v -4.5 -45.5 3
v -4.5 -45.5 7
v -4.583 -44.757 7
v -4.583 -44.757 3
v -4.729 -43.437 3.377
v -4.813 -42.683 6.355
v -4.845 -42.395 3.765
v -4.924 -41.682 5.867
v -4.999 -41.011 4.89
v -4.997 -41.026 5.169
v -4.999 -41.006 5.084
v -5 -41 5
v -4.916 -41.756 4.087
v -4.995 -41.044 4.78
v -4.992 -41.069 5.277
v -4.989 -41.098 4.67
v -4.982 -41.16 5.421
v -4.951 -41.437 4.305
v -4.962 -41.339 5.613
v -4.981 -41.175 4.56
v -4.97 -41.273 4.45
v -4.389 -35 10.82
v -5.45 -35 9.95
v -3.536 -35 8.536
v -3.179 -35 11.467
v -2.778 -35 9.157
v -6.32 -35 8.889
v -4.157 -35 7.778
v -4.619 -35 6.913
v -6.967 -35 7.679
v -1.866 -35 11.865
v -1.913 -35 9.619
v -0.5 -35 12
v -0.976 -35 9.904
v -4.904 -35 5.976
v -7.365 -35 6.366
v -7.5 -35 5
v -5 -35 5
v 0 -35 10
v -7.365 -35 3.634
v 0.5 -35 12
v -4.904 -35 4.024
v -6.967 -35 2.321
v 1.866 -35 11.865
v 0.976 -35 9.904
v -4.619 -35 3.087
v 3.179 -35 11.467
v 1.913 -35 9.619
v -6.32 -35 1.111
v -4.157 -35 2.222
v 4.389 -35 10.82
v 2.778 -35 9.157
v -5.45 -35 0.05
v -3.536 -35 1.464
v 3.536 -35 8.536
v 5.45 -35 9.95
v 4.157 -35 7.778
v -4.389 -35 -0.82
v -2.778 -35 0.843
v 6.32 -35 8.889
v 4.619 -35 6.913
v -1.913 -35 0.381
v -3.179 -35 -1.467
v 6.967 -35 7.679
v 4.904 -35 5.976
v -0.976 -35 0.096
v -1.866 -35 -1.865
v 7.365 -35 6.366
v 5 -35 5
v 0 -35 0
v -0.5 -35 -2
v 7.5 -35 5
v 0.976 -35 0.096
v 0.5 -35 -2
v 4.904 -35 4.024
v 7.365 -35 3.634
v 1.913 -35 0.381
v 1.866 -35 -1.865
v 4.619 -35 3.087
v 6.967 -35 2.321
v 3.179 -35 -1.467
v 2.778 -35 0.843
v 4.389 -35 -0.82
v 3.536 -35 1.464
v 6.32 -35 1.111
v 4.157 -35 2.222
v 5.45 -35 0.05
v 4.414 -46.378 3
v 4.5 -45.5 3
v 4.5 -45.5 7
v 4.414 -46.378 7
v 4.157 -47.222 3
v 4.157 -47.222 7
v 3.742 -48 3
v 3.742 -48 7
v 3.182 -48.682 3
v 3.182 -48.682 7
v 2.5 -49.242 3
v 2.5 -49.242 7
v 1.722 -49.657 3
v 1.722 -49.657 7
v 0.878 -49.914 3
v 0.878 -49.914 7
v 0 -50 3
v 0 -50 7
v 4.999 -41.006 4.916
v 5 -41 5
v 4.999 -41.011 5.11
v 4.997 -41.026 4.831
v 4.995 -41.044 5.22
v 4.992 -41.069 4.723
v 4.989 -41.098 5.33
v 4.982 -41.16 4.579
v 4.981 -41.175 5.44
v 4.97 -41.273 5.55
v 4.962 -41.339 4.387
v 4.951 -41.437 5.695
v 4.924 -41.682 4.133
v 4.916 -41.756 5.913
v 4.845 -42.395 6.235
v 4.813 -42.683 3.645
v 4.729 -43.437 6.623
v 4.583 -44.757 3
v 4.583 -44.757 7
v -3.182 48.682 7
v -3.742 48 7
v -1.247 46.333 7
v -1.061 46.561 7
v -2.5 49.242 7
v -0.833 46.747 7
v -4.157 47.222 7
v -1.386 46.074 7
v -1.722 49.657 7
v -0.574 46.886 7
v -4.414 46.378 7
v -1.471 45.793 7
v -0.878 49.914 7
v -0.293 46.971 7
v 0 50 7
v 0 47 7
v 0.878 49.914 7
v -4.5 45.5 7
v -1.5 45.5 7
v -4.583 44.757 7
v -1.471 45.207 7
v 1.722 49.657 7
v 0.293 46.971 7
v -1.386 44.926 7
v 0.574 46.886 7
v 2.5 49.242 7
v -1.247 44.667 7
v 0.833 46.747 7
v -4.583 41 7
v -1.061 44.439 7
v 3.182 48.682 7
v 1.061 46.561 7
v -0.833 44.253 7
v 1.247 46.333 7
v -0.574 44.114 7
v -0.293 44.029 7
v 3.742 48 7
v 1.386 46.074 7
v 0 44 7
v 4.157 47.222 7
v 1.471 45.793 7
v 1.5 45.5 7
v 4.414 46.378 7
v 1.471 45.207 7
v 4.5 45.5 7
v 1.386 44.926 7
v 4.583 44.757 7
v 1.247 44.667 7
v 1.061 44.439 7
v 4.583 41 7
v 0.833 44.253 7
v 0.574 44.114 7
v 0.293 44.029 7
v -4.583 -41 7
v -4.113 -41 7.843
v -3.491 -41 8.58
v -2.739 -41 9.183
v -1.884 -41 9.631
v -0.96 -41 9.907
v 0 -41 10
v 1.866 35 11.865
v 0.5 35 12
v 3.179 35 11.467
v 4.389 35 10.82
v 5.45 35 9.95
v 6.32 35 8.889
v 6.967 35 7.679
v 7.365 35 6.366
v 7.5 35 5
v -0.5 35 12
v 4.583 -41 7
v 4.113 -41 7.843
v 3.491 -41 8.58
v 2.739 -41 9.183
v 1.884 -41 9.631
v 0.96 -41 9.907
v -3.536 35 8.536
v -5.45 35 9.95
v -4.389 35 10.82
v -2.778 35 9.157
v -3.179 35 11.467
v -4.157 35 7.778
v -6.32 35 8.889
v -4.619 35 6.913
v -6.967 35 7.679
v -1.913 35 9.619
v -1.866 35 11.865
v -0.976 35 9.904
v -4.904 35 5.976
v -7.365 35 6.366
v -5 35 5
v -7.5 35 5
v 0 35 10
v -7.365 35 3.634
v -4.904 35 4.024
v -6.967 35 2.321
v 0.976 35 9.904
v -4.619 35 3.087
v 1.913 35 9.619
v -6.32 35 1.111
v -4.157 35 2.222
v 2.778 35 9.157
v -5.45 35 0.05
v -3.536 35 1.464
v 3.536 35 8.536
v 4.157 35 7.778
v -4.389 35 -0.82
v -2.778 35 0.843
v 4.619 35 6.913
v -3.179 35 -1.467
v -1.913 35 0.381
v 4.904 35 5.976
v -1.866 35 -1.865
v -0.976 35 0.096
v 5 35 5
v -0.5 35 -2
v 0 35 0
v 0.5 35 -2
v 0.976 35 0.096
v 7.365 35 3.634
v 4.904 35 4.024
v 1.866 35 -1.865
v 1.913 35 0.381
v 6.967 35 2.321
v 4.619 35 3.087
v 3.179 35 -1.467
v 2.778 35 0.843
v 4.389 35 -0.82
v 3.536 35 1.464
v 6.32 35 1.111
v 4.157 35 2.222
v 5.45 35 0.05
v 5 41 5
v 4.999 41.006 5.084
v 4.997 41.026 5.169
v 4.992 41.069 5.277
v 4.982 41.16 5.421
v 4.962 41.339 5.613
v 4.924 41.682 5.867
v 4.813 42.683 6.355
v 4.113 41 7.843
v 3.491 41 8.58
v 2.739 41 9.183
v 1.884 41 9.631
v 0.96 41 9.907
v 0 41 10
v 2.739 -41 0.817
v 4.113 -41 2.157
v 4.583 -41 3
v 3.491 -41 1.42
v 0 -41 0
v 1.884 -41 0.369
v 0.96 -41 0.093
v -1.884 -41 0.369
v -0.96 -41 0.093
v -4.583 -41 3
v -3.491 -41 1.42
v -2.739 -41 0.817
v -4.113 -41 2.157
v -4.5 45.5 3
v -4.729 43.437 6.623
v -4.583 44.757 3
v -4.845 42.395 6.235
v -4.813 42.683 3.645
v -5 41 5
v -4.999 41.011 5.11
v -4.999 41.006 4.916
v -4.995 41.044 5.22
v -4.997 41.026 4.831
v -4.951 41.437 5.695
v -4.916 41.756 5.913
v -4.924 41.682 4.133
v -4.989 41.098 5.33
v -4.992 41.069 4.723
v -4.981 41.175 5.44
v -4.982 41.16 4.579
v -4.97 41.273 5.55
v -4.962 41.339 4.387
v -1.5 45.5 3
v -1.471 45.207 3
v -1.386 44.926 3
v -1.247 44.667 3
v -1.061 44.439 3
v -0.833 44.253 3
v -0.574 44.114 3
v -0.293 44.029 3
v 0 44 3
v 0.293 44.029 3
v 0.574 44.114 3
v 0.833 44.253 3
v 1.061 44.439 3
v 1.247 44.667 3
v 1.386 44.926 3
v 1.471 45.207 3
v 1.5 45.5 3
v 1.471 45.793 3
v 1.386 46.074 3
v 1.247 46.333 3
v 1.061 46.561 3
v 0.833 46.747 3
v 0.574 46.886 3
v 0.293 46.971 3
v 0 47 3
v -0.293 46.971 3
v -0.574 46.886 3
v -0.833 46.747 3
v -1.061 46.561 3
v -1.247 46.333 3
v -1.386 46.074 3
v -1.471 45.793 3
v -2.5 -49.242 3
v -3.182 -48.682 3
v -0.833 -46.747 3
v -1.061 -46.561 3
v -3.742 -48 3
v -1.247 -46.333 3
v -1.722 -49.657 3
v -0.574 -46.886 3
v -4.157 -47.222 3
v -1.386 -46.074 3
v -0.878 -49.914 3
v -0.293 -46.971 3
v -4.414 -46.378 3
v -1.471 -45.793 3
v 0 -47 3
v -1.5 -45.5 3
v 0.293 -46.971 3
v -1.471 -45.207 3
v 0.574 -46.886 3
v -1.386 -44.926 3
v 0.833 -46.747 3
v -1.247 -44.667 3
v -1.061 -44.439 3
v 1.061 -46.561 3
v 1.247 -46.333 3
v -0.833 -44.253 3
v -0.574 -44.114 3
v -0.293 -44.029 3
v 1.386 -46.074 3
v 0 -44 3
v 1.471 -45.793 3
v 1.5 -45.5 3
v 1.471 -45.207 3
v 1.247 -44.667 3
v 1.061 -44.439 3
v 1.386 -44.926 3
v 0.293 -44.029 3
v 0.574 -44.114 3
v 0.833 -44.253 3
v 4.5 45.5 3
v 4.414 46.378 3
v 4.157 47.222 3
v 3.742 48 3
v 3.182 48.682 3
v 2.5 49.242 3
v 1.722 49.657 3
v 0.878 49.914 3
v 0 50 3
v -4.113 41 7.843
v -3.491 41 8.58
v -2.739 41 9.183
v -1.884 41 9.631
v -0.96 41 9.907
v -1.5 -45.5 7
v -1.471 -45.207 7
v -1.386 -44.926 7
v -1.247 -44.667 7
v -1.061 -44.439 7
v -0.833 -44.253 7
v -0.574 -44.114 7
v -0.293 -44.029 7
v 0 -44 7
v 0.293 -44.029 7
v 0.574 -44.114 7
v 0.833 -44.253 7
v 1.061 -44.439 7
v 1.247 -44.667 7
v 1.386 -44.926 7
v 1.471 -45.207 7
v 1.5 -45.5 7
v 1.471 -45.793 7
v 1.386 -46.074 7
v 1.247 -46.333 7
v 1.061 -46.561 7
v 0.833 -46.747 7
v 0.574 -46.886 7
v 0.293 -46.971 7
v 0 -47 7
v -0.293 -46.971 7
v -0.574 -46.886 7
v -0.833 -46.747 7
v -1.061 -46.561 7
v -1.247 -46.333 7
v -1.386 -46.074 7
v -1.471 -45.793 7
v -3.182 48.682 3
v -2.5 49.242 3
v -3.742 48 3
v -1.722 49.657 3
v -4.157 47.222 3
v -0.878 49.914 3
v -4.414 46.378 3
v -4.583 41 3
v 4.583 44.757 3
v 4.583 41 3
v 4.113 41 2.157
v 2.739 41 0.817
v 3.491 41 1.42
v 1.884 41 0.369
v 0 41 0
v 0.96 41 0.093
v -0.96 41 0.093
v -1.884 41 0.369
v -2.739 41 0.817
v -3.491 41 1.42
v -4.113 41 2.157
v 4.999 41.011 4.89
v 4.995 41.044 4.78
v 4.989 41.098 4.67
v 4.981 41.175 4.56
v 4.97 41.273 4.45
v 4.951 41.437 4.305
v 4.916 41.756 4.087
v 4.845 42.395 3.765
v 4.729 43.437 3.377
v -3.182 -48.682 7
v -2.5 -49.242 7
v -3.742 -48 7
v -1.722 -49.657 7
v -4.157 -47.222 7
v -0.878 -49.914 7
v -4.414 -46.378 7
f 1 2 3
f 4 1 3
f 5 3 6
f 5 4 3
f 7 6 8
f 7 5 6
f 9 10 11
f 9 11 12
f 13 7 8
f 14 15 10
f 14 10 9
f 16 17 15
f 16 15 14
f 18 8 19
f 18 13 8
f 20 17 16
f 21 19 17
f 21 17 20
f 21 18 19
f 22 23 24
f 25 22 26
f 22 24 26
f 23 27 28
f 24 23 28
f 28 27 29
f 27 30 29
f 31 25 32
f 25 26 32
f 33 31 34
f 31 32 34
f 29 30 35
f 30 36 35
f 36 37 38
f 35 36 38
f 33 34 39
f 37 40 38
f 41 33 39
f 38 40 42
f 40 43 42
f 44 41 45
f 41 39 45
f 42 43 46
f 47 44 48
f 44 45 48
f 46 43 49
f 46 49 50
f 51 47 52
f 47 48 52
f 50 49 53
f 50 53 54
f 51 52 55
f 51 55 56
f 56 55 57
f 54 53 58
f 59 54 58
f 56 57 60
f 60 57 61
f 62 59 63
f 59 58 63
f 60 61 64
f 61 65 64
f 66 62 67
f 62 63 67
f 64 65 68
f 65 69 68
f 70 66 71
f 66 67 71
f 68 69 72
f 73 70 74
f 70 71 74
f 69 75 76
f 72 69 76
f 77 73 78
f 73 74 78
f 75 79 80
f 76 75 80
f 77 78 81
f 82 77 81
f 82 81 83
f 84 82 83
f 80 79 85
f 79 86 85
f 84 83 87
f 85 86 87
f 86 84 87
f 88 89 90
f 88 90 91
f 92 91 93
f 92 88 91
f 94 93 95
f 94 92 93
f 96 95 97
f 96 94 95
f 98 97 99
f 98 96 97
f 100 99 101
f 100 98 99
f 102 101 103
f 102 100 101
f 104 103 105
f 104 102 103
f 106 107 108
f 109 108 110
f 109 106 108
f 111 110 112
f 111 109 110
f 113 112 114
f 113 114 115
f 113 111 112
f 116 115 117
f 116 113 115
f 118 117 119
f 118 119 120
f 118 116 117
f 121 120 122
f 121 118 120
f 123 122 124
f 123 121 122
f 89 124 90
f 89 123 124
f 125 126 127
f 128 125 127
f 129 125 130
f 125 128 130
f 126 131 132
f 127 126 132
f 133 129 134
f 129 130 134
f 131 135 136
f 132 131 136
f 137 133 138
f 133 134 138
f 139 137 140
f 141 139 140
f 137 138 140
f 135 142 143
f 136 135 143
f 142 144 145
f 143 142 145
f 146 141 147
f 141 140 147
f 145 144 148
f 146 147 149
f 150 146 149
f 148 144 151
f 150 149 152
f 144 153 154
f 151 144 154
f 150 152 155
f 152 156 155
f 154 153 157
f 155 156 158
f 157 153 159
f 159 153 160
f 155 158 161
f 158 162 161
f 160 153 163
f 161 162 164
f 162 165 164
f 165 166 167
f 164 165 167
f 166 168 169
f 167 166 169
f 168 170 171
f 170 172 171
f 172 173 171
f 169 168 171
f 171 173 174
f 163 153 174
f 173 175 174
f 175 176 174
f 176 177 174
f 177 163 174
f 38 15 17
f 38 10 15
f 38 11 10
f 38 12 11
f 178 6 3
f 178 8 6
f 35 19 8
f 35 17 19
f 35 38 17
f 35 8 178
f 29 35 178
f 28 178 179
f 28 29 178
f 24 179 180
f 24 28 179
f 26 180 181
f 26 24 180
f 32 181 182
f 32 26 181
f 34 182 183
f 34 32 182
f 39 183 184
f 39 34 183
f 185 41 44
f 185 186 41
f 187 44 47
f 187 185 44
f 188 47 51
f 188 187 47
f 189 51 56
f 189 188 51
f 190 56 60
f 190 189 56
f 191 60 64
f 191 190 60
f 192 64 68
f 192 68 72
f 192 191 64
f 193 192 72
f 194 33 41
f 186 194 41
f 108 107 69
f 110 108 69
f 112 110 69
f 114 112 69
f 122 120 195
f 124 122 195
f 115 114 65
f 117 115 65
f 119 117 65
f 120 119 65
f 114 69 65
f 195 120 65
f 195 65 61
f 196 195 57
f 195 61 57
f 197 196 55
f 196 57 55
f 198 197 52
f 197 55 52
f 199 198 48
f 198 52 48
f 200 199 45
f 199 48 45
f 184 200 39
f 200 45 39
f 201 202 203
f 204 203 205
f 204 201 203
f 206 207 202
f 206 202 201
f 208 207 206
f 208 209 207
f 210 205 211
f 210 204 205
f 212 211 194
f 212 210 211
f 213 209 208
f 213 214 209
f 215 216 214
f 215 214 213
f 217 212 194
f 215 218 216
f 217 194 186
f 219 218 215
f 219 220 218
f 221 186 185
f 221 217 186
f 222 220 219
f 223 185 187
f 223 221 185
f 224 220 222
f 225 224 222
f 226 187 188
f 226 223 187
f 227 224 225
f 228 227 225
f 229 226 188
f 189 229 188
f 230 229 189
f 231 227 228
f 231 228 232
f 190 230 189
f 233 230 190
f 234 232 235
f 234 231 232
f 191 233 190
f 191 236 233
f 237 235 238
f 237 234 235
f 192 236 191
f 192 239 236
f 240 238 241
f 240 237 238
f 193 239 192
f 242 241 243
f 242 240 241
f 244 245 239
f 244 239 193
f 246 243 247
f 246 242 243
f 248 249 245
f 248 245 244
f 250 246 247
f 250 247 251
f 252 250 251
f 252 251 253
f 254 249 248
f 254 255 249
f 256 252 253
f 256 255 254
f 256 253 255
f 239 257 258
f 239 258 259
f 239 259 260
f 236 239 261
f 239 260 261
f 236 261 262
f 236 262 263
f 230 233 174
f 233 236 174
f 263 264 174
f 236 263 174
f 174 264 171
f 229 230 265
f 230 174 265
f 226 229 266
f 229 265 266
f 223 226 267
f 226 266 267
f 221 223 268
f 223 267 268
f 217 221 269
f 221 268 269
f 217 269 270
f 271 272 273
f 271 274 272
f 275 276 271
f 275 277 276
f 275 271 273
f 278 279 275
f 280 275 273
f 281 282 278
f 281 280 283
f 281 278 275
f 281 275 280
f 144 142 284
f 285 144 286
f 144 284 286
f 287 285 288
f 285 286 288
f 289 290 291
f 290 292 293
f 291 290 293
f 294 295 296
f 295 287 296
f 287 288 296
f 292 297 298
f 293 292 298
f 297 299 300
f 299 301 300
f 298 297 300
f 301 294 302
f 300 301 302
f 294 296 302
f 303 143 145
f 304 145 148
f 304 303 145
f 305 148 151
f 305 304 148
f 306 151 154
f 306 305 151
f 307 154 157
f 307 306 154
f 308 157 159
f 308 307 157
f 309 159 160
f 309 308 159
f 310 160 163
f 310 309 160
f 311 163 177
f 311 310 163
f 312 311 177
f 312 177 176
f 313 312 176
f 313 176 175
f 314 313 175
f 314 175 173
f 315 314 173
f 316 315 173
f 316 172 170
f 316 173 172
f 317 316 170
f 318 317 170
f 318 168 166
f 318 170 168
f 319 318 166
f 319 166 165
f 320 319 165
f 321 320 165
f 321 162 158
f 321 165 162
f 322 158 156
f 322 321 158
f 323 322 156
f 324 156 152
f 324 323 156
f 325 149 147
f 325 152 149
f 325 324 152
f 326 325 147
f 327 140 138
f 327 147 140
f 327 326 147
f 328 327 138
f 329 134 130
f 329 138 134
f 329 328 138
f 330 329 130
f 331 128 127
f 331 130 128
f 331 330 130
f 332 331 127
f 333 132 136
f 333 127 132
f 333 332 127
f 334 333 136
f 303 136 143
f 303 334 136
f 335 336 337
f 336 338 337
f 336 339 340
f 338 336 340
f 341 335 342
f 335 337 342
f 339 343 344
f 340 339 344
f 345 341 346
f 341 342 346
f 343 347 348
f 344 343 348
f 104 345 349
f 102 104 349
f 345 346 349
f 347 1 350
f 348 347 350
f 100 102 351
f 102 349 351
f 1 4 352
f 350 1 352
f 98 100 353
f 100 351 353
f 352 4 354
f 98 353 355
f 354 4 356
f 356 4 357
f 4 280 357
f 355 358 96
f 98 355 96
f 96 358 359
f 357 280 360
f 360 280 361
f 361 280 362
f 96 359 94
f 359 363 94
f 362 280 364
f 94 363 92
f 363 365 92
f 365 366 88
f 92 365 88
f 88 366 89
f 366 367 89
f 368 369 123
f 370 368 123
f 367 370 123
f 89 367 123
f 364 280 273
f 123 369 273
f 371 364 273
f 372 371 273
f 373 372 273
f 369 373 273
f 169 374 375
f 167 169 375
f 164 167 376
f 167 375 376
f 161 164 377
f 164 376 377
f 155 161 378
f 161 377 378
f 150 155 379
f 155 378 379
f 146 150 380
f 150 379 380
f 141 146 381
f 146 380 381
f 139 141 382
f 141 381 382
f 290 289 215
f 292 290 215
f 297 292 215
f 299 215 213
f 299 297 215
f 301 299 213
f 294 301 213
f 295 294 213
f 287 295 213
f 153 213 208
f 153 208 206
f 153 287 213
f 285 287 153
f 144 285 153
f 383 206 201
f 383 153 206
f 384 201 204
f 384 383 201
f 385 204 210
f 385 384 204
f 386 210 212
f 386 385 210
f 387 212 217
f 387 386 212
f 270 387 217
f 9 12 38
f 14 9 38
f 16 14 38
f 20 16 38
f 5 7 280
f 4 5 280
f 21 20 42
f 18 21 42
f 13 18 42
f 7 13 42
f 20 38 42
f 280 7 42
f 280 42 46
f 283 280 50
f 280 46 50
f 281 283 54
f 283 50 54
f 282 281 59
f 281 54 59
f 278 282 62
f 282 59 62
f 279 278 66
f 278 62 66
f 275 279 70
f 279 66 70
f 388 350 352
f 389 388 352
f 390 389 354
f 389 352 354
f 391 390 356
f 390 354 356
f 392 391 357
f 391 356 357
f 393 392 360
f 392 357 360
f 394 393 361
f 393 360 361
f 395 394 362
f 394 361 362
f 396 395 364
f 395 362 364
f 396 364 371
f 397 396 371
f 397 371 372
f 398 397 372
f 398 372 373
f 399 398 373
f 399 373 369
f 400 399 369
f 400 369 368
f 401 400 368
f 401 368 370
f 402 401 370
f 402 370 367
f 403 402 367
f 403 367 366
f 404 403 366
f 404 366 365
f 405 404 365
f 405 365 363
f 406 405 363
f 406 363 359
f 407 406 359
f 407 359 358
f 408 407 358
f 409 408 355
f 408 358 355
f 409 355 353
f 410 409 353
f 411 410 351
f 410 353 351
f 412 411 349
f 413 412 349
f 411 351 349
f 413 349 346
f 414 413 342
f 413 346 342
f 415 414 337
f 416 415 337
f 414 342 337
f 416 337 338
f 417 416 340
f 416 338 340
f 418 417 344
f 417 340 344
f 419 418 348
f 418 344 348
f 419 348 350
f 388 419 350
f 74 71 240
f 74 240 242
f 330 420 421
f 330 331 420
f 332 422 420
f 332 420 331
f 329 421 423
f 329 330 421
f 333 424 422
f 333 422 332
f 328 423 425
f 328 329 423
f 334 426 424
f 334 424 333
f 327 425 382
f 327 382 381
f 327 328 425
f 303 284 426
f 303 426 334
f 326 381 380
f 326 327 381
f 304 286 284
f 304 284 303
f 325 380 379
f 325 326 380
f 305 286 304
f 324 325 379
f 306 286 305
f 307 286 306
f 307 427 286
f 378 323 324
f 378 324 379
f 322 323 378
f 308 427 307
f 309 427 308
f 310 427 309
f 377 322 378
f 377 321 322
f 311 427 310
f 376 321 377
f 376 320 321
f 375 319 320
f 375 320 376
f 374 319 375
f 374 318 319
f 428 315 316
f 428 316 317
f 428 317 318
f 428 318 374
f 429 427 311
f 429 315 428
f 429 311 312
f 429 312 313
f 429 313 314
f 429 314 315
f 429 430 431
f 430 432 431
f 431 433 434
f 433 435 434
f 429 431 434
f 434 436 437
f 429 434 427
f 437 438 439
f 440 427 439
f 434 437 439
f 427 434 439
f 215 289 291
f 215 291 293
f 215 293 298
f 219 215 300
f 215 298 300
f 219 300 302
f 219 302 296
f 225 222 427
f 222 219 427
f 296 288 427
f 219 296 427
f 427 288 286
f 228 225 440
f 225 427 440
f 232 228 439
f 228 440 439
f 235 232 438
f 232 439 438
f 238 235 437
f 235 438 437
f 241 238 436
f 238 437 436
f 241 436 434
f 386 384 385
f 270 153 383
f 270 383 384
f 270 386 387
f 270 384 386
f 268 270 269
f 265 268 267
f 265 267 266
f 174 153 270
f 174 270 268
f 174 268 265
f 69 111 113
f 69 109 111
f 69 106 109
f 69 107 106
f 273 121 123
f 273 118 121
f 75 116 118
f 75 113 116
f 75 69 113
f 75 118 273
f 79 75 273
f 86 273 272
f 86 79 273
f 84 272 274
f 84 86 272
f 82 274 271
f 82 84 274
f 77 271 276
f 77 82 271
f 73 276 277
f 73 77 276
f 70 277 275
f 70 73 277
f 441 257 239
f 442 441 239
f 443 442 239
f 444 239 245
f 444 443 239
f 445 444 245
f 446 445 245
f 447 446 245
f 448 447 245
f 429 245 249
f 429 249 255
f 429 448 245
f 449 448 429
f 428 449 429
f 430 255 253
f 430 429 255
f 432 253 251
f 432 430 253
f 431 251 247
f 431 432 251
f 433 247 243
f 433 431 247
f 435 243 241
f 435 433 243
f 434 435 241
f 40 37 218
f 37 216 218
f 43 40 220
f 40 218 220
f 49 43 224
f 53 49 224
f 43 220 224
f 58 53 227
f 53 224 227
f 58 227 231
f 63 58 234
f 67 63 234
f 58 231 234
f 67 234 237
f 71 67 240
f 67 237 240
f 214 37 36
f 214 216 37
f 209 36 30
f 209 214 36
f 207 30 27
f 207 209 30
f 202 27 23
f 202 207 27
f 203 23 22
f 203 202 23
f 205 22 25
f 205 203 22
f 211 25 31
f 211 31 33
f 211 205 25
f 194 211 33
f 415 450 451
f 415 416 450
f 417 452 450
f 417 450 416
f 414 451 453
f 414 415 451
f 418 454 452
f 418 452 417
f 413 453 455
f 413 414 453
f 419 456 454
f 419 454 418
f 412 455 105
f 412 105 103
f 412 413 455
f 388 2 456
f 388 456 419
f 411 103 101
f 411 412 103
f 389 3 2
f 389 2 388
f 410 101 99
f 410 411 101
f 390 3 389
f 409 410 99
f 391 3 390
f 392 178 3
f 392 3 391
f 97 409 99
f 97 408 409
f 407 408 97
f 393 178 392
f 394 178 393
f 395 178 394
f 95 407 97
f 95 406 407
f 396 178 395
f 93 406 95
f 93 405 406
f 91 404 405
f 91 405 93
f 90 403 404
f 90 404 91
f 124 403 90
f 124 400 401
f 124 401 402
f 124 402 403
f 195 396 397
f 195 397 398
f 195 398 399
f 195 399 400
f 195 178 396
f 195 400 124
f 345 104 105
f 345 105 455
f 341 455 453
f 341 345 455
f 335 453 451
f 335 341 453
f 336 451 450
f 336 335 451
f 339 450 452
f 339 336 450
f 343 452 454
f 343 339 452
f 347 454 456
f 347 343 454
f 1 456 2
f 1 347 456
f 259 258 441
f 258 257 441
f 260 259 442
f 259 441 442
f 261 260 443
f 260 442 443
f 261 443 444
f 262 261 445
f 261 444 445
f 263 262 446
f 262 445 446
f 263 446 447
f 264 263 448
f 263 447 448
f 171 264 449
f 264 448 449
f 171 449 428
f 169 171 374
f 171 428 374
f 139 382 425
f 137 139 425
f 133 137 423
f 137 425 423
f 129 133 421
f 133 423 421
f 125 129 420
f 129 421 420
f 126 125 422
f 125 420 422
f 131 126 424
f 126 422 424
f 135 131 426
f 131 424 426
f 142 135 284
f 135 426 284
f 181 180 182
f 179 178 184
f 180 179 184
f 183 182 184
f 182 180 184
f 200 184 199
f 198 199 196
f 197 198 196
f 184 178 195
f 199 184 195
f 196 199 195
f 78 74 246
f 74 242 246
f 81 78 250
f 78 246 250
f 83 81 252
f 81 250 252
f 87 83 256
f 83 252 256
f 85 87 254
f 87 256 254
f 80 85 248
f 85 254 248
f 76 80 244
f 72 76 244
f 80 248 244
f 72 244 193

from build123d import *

# Parameters (mm, degrees)
SKETCH2_W                = 10
SKETCH2_H                = 100
BOSS_EXTRUDE1_DEPTH      = 10
FILLET1_R                = 5
CUT_EXTRUDE1_DEPTH       = 3
CUT_EXTRUDE2_START       = 7
SKETCH3_2_W              = 10
SKETCH3_2_H              = 9
CUT_EXTRUDE2_DEPTH       = 3
CUT_EXTRUDE4_START       = -4
CUT_EXTRUDE4_DEPTH       = 56.23475383
SKETCH7_R                = 1.5
CUT_EXTRUDE5_DEPTH       = 51.734603576
BOSS_EXTRUDE2_DEPTH      = 7
BOSS_EXTRUDE2_DEPTH_BACK = 7
SKETCH9_W                = 15
SKETCH9_H                = 70
FILLET3_R                = 7


with BuildPart() as part:
    # Sketch2 → Boss-Extrude1 (new body)
    with BuildSketch(Plane.XY):
        Rectangle(SKETCH2_W, SKETCH2_H)
    extrude(amount=BOSS_EXTRUDE1_DEPTH)

    # Fillet1
    fillet1_edges = [part.edges().sort_by_distance(p)[0] for p in [
        (-5, 0, 0),
        (5, 0, 0),
        (5, 0, 10),
        (-5, 0, 10),
    ]]
    fillet(fillet1_edges, radius=FILLET1_R - 0.0001)  # a hair under: the kernel refuses the full size

    # Sketch3 → Cut-Extrude1 (cut)
    with BuildSketch(Plane.XY):
        with BuildLine():
            Line((-5, -41), (-4.5, -45.5))
            ThreePointArc((-4.5, -45.5), (0, -50), (4.5, -45.5))
            Line((4.5, -45.5), (5, -41))
            Line((5, -41), (-5, -41))
        make_face()
        with BuildLine():
            Line((0, -50), (5, -50))
            Line((5, -50), (5, -41))
            Line((5, -41), (4.5, -45.5))
            ThreePointArc((4.5, -45.5), (3.181980515, -48.681980515), (0, -50))
        make_face()
        with BuildLine():
            Line((-5, -50), (0, -50))
            ThreePointArc((0, -50), (-3.181980515, -48.681980515), (-4.5, -45.5))
            Line((-4.5, -45.5), (-5, -41))
            Line((-5, -41), (-5, -50))
        make_face()
    cut_extrude1 = extrude(amount=CUT_EXTRUDE1_DEPTH, mode=Mode.SUBTRACT)

    # Sketch3<2> → Cut-Extrude2 (cut)
    with BuildSketch(Plane.XY.offset(CUT_EXTRUDE2_START)):
        with Locations((0, -45.5)):
            Rectangle(SKETCH3_2_W, SKETCH3_2_H)
    cut_extrude2 = extrude(amount=CUT_EXTRUDE2_DEPTH, mode=Mode.SUBTRACT)

    # Mirror1: Cut-Extrude1, Cut-Extrude2 across plane
    add(cut_extrude1.mirror(Plane.ZX), mode=Mode.SUBTRACT)
    add(cut_extrude2.mirror(Plane.ZX), mode=Mode.SUBTRACT)

    # Sketch3<4> → Cut-Extrude4 (cut)
    with BuildSketch(Plane.XY.offset(CUT_EXTRUDE4_START)):
        with BuildLine():
            Line((0, -50), (5, -50))
            Line((5, -50), (5, -41))
            Line((5, -41), (4.5, -45.5))
            ThreePointArc((4.5, -45.5), (3.181980515, -48.681980515), (0, -50))
        make_face()
        with BuildLine():
            Line((-5, -50), (0, -50))
            ThreePointArc((0, -50), (-3.181980515, -48.681980515), (-4.5, -45.5))
            Line((-4.5, -45.5), (-5, -41))
            Line((-5, -41), (-5, -50))
        make_face()
    cut_extrude4 = extrude(amount=CUT_EXTRUDE4_DEPTH, mode=Mode.SUBTRACT)

    # Sketch7 → Cut-Extrude5 (cut, through all)
    with BuildSketch(Plane(origin=(0, 0, 3), x_dir=(-1, 0, 0), z_dir=(0, 0, -1))):
        with Locations((0, -45.5)):
            Circle(SKETCH7_R)
    cut_extrude5 = extrude(amount=-CUT_EXTRUDE5_DEPTH, mode=Mode.SUBTRACT)

    # Mirror3: Cut-Extrude5 across plane
    add(cut_extrude5.mirror(Plane.ZX), mode=Mode.SUBTRACT)

    # Mirror4: Cut-Extrude4 across plane
    add(cut_extrude4.mirror(Plane.ZX), mode=Mode.SUBTRACT)

    # Sketch9 → Boss-Extrude2 (add, two sides: drawn at the far end of the back side and taken through both)
    with BuildSketch(Plane.XY.offset(5).offset(-BOSS_EXTRUDE2_DEPTH_BACK)):
        Rectangle(SKETCH9_W, SKETCH9_H)
    extrude(amount=BOSS_EXTRUDE2_DEPTH + BOSS_EXTRUDE2_DEPTH_BACK)

    # Fillet3
    fillet3_edges = [part.edges().sort_by_distance(p)[0] for p in [
        (-7.5, 0, 12),
        (7.5, 0, 12),
        (7.5, 0, -2),
        (-7.5, 0, -2),
    ]]
    fillet(fillet3_edges, radius=FILLET3_R - 0.0001)  # a hair under: the kernel refuses the full size


solid = part.part
